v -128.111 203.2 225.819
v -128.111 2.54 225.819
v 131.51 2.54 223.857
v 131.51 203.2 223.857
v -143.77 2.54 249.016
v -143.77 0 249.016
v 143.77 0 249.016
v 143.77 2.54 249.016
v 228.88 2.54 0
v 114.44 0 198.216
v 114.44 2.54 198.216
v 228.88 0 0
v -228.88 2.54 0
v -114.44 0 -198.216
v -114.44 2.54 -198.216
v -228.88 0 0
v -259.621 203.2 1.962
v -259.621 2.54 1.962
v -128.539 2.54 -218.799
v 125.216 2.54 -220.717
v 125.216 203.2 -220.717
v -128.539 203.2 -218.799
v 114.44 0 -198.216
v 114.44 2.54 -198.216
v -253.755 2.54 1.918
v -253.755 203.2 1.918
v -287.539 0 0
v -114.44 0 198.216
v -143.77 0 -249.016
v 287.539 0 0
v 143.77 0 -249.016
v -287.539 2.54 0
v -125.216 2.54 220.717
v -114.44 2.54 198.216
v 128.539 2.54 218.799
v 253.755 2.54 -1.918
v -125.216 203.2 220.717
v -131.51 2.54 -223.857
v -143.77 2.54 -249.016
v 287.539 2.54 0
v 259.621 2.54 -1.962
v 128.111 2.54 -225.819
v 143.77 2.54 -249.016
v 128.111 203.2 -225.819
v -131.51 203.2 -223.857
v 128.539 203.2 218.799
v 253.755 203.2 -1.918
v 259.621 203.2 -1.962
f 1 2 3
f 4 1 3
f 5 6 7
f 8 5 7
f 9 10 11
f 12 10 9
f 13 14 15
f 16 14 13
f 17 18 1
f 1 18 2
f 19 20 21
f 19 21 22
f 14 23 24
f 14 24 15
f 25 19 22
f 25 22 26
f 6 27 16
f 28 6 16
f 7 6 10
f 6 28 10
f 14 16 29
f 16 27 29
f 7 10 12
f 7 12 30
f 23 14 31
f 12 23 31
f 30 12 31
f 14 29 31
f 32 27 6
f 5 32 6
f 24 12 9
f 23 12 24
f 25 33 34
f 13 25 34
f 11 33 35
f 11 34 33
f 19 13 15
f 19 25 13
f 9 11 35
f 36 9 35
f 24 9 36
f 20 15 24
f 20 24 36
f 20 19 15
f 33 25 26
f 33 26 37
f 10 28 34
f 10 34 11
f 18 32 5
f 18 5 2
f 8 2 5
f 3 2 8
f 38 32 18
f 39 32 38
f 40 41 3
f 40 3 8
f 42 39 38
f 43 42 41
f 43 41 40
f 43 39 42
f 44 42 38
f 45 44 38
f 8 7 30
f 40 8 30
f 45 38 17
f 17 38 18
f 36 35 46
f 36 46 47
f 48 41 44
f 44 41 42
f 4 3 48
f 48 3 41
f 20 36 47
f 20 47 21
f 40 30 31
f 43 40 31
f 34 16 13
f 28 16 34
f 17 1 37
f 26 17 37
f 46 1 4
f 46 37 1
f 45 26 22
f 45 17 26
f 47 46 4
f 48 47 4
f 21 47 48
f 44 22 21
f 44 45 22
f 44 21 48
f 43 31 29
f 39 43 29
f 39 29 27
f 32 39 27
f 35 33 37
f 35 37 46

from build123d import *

# Parameters (mm, degrees)
BOSS_EXTRUDE1_DEPTH = 2.54
BOSS_EXTRUDE2_DEPTH = 203.2


with BuildPart() as part:
    # Sketch1 → Boss-Extrude1 (new body)
    with BuildSketch(Plane(origin=(0, 0, 0), x_dir=(1, 0, 0), z_dir=(0, 1, 0))):
        Polygon((143.769509274, -249.016094641), (287.539018547, 0), (143.769509274, 249.016094641), (-143.769509274, 249.016094641), (-287.539018547, 0), (-143.769509274, -249.016094641), align=None)
        Polygon((114.440115599, -198.216094641), (228.880231198, 0), (114.440115599, 198.216094641), (-114.440115599, 198.216094641), (-228.880231198, 0), (-114.440115599, -198.216094641), align=None, mode=Mode.SUBTRACT)
    extrude(amount=BOSS_EXTRUDE1_DEPTH)

    # Sketch2 → Boss-Extrude2 (add)
    with BuildSketch(Plane(origin=(0, 0, 0), x_dir=(1, 0, 0), z_dir=(0, 1, 0))):
        Polygon((128.11073119, 225.819195391), (-131.509794276, 223.856745403), (-259.620525466, -1.962449988), (-128.11073119, -225.819195391), (131.509794276, -223.856745403), (259.620525466, 1.962449988), align=None)
        Polygon((125.21627381, 220.717171301), (-128.538540494, 218.799059737), (-253.754814303, -1.918111564), (-125.21627381, -220.717171301), (128.538540494, -218.799059737), (253.754814303, 1.918111564), align=None, mode=Mode.SUBTRACT)
    extrude(amount=BOSS_EXTRUDE2_DEPTH)


solid = part.part
